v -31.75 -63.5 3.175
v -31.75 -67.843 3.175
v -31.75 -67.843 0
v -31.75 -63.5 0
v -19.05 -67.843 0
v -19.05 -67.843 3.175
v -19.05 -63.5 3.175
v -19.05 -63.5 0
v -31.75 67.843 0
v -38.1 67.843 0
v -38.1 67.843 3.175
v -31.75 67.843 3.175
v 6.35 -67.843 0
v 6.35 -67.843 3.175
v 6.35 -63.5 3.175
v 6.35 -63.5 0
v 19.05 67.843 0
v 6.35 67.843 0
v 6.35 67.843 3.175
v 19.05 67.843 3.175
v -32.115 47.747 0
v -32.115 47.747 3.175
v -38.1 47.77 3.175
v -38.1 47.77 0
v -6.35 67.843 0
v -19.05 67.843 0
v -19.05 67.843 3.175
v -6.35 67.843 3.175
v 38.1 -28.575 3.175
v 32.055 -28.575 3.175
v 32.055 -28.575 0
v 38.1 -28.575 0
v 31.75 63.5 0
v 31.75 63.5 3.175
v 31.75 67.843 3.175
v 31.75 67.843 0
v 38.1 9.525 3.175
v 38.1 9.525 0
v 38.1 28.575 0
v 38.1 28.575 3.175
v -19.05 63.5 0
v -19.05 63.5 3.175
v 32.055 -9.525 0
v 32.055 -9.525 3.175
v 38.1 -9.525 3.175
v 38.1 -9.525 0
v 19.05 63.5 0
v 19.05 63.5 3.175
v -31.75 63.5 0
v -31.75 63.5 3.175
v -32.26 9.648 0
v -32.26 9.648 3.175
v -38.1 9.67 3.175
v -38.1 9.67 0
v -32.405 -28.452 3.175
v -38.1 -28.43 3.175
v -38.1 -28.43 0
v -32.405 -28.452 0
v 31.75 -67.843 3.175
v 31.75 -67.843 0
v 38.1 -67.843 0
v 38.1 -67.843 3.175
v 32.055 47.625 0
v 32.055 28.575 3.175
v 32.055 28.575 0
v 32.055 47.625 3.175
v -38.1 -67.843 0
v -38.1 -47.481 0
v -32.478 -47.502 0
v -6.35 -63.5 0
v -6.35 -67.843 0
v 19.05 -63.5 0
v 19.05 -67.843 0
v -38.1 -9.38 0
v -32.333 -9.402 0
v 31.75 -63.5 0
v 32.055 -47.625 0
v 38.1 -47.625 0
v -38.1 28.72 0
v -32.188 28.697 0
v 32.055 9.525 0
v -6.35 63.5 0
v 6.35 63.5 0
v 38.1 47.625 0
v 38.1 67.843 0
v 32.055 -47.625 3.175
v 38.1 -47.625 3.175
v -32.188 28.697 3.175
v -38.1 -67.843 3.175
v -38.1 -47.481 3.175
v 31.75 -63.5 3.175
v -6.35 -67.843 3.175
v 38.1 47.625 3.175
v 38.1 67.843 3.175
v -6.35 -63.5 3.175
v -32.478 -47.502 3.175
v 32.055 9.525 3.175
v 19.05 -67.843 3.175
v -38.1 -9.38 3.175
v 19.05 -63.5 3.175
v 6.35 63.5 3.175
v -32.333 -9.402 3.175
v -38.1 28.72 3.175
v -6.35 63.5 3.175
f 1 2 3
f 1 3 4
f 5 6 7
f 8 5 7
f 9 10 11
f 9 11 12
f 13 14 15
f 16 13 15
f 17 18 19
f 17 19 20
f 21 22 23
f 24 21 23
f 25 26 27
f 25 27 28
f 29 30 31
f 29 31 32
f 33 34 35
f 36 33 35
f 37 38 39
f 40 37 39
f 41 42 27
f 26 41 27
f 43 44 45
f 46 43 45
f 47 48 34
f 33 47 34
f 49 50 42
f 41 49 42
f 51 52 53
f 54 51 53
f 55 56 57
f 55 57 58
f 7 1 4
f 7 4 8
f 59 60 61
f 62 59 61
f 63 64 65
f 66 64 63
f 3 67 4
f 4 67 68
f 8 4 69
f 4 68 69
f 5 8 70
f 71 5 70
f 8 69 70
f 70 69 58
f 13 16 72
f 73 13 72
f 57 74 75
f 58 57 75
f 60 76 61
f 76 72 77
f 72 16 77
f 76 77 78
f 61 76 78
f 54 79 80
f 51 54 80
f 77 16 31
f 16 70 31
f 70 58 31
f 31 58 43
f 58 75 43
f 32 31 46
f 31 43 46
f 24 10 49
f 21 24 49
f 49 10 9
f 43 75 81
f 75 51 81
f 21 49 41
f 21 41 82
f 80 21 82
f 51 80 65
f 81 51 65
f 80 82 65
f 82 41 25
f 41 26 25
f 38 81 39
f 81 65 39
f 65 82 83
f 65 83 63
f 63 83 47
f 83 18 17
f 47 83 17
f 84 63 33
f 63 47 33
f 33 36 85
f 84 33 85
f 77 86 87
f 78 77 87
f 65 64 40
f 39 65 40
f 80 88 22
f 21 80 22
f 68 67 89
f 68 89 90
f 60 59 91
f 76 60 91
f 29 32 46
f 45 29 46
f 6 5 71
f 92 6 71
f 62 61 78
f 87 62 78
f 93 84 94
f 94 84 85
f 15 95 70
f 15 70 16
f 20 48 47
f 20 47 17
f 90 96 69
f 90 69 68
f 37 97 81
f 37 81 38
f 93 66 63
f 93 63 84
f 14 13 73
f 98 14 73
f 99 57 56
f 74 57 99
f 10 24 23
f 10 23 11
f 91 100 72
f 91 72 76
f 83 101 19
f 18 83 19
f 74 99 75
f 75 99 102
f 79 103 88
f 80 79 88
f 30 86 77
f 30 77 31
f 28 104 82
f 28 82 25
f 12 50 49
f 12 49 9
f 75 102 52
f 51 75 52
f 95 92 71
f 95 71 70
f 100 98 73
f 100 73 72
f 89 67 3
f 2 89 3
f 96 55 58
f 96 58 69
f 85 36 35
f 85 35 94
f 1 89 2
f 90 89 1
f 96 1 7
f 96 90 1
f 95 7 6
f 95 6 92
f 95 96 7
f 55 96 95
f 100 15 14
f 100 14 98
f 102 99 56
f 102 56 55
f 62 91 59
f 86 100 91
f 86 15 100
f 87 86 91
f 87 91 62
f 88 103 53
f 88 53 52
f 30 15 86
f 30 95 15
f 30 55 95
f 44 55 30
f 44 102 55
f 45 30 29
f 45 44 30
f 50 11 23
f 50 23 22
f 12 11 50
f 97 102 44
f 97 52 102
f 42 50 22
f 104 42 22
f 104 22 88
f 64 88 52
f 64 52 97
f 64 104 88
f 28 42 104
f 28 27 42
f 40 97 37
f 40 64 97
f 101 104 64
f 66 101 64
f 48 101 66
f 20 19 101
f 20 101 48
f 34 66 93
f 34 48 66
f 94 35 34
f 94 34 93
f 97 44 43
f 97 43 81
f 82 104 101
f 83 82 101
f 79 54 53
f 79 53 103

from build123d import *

# Parameters (mm, degrees)
SKETCH1_W           = 76.2
SKETCH1_H           = 135.6868
BOSS_EXTRUDE1_DEPTH = 3.175
SKETCH2_W           = 12.7
SKETCH2_H           = 8.6868
CUT_EXTRUDE1_DEPTH  = 78.874370293
SKETCH3_W           = 12.0904
SKETCH3_H           = 19.05
CUT_EXTRUDE2_DEPTH  = 78.874370293


with BuildPart() as part:
    # Sketch1 → Boss-Extrude1 (new body)
    with BuildSketch(Plane.XY):
        Rectangle(SKETCH1_W, SKETCH1_H)
    extrude(amount=BOSS_EXTRUDE1_DEPTH)

    # Sketch2 → Cut-Extrude1 (cut, through all)
    with BuildSketch(Plane.XY.offset(3.175)):
        with Locations((0, 67.8434)):
            Rectangle(SKETCH2_W, SKETCH2_H)
        with Locations((-25.4, 67.8434)):
            Rectangle(SKETCH2_W, SKETCH2_H)
        with Locations((25.4, 67.8434)):
            Rectangle(SKETCH2_W, SKETCH2_H)
        with Locations((25.4, -67.8434)):
            Rectangle(SKETCH2_W, SKETCH2_H)
        with Locations((-25.4, -67.8434)):
            Rectangle(SKETCH2_W, SKETCH2_H)
        with Locations((0, -67.8434)):
            Rectangle(SKETCH2_W, SKETCH2_H)
    extrude(amount=-CUT_EXTRUDE1_DEPTH, mode=Mode.SUBTRACT)

    # Sketch3 → Cut-Extrude2 (cut, through all)
    with BuildSketch(Plane.XY.offset(3.175)):
        with Locations((38.1, 0)):
            Rectangle(SKETCH3_W, SKETCH3_H)
        with Locations((38.1, 38.1)):
            Rectangle(SKETCH3_W, SKETCH3_H)
        with Locations((38.1, -38.1)):
            Rectangle(SKETCH3_W, SKETCH3_H)
        Polygon((-44.277990322, 28.743505915), (-32.187678137, 28.697425322), (-32.115072161, 47.747286959), (-44.205384346, 47.793367552), align=None)
        Polygon((-32.332890089, -9.402297951), (-32.260284113, 9.647563686), (-44.350596298, 9.693644279), (-44.423202274, -9.356217358), align=None)
        Polygon((-32.405496065, -28.452159587), (-32.478102041, -47.502021224), (-44.568414227, -47.455940631), (-44.495808251, -28.406078995), align=None)
    extrude(amount=-CUT_EXTRUDE2_DEPTH, mode=Mode.SUBTRACT)


solid = part.part
